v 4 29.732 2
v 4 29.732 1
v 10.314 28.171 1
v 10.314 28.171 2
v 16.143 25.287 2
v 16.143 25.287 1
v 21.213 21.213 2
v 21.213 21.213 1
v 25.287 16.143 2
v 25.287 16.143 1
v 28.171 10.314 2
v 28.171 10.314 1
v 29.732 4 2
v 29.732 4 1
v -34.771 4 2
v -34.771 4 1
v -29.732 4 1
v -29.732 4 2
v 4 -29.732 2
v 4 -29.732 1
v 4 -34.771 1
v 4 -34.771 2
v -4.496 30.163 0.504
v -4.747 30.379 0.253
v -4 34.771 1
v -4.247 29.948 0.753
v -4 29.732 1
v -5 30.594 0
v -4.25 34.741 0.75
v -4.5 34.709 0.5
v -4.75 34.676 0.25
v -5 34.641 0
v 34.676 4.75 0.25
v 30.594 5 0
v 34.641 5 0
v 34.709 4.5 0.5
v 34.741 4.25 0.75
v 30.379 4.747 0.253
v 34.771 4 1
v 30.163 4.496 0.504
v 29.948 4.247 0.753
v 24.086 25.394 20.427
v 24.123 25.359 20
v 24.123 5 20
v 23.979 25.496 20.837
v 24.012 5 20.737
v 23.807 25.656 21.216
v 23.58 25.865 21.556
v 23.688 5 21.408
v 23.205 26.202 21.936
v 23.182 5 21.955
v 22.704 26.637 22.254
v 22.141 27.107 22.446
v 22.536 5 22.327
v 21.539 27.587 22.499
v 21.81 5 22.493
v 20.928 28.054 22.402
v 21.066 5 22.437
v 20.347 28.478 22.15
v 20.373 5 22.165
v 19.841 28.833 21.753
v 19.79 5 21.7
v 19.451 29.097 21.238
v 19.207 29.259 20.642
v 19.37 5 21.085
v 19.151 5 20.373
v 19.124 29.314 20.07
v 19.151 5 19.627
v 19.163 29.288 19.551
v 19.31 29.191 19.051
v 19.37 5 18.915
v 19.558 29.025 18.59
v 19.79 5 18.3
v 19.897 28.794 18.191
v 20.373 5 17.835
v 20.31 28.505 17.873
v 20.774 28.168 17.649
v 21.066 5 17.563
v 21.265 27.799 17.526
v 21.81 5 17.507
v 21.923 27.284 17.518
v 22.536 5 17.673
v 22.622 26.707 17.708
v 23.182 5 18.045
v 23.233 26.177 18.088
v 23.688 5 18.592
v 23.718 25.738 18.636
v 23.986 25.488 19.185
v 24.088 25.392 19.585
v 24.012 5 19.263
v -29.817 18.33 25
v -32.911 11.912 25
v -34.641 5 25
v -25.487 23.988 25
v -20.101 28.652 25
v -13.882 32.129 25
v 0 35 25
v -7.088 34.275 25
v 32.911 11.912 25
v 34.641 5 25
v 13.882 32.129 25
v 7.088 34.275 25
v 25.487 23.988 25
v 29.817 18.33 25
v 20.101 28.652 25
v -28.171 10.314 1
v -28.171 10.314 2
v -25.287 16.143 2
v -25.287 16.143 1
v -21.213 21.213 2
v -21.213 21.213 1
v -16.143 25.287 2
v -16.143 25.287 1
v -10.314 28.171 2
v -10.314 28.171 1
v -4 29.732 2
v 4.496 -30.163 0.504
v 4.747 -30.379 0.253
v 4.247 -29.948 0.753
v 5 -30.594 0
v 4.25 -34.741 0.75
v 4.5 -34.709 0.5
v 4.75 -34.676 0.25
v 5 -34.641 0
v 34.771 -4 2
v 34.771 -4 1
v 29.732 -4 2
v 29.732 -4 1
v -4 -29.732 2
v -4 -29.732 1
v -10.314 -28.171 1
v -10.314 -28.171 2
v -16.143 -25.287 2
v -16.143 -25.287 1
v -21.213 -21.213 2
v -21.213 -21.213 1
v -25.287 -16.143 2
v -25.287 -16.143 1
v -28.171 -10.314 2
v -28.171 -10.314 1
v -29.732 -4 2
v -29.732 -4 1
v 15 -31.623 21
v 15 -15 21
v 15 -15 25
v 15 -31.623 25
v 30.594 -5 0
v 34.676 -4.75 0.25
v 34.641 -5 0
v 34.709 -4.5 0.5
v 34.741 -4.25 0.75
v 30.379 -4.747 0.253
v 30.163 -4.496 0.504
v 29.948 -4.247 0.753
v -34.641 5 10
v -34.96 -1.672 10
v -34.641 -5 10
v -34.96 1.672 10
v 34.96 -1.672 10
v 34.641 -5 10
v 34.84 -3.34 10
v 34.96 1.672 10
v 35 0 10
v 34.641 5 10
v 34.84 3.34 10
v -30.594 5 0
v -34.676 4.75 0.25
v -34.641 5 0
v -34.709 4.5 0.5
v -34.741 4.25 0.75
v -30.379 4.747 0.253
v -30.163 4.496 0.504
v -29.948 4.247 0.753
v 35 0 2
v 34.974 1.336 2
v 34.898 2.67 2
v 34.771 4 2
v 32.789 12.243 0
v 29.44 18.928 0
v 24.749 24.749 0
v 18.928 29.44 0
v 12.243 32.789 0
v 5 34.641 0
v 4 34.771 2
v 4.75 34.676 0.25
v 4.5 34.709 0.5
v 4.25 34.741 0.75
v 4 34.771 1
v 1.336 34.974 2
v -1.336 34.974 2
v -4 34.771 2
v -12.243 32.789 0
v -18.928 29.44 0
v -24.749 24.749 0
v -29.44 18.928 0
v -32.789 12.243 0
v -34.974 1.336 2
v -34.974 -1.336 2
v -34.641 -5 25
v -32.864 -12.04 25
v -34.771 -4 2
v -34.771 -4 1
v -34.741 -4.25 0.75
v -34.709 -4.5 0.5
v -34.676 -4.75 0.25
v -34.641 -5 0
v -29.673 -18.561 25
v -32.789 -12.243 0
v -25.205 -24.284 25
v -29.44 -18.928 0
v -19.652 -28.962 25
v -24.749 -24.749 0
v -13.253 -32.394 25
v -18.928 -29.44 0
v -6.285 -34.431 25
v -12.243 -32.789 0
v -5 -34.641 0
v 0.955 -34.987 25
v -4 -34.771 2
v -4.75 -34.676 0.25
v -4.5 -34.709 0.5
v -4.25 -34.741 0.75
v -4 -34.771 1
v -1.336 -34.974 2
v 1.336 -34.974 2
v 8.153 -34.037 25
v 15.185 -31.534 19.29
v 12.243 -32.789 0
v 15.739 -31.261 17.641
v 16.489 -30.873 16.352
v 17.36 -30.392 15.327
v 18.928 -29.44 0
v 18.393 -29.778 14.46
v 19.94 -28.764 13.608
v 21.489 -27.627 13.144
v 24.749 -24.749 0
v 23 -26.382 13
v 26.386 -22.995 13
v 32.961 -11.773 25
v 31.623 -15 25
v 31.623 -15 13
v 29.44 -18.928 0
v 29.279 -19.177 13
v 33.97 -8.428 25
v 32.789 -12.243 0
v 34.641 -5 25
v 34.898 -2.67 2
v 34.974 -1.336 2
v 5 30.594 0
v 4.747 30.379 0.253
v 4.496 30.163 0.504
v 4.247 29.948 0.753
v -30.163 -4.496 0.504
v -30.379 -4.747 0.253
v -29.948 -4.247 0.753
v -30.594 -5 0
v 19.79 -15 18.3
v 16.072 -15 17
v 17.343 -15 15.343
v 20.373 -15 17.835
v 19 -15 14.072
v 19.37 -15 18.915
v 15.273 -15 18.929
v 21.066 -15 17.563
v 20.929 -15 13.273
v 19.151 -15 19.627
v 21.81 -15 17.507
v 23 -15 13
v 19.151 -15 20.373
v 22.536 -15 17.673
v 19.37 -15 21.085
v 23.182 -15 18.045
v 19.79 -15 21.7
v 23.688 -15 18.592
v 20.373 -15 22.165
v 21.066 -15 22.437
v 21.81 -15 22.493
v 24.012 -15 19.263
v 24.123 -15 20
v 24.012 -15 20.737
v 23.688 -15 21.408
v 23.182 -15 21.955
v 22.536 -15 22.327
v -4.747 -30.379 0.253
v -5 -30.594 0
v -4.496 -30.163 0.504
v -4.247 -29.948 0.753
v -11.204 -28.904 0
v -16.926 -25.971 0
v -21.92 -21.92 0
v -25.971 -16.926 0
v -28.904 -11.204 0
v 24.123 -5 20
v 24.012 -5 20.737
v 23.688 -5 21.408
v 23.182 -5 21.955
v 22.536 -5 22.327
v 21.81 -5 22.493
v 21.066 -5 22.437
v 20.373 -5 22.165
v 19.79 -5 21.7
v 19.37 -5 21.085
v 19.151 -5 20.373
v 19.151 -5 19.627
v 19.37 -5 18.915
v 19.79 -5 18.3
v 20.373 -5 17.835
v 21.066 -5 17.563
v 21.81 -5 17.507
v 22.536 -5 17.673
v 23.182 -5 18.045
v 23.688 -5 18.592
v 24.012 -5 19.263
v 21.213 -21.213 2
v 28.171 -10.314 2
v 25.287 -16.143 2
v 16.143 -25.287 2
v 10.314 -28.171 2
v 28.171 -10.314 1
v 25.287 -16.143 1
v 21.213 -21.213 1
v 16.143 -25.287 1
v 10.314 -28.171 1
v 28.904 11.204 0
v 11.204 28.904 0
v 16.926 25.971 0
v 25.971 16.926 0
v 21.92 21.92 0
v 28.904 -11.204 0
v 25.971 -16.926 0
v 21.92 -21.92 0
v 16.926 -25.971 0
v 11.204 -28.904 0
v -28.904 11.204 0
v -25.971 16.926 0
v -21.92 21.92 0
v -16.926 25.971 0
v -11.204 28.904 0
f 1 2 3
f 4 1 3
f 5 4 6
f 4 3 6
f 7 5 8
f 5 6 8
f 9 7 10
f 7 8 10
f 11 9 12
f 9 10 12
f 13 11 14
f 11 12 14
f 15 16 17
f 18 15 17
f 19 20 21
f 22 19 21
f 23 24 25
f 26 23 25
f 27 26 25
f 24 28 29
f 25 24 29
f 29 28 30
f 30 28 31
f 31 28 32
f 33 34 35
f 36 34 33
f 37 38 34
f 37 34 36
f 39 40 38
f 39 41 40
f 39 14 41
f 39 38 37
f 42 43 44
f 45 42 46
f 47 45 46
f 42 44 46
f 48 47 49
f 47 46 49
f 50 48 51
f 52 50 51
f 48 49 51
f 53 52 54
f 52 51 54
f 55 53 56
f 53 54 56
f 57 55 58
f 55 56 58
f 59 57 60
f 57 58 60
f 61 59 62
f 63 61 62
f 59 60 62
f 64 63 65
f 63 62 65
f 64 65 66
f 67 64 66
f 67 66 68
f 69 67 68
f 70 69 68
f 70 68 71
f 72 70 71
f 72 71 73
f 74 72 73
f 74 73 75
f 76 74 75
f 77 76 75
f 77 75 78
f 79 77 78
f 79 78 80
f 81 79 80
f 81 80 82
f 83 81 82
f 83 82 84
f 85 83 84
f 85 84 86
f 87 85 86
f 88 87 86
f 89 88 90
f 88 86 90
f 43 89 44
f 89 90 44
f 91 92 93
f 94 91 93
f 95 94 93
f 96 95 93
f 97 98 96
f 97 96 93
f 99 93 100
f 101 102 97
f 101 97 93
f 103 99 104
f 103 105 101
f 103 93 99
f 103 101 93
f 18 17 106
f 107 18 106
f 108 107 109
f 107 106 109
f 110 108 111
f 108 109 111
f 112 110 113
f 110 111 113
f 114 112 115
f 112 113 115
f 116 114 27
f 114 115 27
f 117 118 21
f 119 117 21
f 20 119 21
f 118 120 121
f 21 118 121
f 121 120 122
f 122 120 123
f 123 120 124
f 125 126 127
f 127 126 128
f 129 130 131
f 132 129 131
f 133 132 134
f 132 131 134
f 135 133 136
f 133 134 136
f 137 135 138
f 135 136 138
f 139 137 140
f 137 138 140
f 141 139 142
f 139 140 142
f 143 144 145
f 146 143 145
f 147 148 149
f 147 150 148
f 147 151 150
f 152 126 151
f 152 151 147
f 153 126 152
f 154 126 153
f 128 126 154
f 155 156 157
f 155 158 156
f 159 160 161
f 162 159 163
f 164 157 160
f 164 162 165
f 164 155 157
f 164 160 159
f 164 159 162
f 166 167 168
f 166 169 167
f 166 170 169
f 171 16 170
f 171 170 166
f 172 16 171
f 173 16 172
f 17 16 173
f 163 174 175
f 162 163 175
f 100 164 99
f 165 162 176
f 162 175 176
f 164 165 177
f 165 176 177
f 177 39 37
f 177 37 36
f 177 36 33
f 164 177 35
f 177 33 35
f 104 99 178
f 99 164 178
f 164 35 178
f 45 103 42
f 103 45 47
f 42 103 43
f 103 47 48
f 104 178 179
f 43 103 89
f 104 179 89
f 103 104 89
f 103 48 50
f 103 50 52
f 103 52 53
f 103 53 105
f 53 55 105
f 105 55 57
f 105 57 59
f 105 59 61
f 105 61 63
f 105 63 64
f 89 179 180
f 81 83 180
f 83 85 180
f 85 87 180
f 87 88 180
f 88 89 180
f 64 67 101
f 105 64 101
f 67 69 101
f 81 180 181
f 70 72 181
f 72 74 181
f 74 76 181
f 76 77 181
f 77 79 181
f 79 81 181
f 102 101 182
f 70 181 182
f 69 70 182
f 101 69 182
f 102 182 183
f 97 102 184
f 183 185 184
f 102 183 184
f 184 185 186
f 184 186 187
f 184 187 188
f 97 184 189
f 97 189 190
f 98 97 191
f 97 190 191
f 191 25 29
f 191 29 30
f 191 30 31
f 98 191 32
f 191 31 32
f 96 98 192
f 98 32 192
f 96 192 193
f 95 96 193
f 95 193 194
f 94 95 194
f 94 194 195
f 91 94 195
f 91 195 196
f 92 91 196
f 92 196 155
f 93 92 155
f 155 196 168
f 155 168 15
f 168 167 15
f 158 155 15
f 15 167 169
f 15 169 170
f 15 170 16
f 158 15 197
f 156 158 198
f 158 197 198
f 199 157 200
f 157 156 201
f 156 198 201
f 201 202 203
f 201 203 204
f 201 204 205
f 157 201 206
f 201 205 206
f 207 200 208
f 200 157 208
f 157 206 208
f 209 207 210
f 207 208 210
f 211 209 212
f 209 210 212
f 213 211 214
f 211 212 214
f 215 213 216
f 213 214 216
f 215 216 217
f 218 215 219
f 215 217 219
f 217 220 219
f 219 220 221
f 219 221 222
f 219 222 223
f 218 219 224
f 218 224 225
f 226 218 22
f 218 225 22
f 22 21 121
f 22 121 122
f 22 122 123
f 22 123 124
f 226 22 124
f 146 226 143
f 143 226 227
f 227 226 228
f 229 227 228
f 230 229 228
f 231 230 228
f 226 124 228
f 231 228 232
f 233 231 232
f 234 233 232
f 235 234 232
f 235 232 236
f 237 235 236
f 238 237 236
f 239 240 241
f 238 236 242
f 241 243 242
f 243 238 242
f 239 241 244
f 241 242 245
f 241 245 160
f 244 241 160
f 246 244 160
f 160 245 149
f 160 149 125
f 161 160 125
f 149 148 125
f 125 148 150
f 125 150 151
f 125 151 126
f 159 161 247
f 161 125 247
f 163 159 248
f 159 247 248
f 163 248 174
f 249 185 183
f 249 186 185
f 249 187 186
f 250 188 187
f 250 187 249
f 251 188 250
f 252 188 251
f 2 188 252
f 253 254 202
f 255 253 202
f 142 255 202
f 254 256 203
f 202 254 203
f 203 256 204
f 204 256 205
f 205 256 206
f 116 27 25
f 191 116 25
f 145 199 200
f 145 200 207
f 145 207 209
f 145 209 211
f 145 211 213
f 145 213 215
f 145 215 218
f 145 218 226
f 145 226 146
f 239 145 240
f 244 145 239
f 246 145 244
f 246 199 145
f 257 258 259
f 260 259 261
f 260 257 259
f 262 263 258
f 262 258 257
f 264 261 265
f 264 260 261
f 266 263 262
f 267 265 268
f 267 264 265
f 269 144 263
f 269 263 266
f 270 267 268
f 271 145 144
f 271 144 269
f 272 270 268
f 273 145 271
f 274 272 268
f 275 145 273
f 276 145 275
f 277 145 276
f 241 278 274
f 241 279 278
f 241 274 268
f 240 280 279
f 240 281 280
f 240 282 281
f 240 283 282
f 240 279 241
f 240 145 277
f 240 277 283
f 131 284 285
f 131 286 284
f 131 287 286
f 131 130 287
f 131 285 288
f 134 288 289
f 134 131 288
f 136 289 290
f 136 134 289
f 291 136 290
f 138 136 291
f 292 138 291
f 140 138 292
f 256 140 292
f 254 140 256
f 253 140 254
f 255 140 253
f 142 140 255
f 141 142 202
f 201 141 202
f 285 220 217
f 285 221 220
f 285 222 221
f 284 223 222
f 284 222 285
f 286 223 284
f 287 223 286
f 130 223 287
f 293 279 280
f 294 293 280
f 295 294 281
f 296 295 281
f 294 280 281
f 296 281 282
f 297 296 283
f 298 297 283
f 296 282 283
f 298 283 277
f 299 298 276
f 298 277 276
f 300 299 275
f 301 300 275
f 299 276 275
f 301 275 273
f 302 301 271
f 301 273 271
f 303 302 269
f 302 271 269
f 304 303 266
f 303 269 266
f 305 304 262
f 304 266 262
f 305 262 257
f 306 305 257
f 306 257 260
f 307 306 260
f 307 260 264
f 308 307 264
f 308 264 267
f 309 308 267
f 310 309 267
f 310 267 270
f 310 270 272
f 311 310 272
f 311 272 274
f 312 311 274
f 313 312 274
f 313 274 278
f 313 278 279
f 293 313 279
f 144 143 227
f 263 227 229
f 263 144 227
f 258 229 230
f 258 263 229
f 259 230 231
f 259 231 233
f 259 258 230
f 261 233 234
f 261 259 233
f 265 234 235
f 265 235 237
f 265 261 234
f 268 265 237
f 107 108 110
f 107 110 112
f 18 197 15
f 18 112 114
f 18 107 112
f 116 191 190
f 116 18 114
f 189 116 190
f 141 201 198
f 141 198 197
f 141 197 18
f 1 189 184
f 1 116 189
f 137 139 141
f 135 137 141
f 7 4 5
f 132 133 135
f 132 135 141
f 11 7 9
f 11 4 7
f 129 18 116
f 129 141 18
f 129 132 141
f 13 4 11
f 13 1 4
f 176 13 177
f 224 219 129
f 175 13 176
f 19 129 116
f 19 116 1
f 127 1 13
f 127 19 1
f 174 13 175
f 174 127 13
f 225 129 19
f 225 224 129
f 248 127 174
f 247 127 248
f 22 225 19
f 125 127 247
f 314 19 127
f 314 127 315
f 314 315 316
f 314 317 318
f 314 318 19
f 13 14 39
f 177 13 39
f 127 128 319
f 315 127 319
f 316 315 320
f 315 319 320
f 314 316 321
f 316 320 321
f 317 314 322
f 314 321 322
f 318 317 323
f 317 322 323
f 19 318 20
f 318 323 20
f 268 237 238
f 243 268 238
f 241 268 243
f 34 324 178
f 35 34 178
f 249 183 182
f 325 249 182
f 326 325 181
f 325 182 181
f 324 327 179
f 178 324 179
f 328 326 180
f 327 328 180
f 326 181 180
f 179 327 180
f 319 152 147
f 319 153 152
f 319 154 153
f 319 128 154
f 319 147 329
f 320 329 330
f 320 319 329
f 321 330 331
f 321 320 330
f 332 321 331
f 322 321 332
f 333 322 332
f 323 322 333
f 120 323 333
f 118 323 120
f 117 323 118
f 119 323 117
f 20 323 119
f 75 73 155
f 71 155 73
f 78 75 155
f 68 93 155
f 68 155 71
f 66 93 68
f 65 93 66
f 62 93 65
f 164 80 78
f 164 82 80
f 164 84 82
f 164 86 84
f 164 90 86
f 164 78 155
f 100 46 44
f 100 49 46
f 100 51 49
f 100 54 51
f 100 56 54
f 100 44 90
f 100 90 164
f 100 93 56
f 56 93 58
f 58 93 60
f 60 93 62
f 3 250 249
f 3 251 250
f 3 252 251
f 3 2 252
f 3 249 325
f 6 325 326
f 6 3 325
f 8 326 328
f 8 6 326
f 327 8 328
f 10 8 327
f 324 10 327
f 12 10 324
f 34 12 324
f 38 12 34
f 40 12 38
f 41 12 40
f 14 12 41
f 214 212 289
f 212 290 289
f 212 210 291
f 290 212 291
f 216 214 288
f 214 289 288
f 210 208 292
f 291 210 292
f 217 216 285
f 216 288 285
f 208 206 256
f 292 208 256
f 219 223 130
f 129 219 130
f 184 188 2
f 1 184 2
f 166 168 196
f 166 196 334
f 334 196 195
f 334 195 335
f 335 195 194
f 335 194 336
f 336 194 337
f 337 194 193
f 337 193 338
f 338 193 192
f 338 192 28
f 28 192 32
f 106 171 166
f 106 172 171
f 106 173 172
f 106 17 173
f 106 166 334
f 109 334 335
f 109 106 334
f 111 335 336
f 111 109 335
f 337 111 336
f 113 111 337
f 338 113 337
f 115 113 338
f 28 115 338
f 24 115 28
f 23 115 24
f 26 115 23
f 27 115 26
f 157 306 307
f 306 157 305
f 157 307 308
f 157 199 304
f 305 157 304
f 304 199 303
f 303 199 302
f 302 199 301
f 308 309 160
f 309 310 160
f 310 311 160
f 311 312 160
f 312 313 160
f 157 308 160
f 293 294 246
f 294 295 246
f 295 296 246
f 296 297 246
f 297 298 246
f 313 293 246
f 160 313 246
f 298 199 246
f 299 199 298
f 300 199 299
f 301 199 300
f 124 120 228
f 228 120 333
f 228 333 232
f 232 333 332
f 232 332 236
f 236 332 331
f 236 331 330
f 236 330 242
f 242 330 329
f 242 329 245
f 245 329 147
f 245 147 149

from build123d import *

# Parameters (mm, degrees)
F0_R      = 35
F1_DEPTH  = 25
F2_W      = 70
F2_H      = 10
F3_DEPTH  = 15
F5_W      = 8
F5_H      = 12
F6_DEPTH  = 25
F7_R      = 2.5
F8_DEPTH  = 50
F10_DEPTH = 2
F11_SIZE  = 1


with BuildPart() as f1:
    # F0 (on Top) → F1 (new body)
    with BuildSketch(Plane.XY):
        Circle(F0_R)
    extrude(amount=F1_DEPTH)

    # F2 (on face) → F3 (cut)
    with BuildSketch(Plane.XY.offset(25)):
        Rectangle(F2_W, F2_H)
    extrude(amount=-F3_DEPTH, mode=Mode.SUBTRACT)

    # F5 (on offset) → F6 (cut)
    with BuildSketch(Plane.XZ.offset(15)):
        Polygon((58, 13), (58, 33), (23, 33), (23, 21), (23, 13), align=None)
        with Locations((19, 27)):
            Rectangle(F5_W, F5_H)
        with BuildLine():
            Line((23, 13), (23, 21))
            Line((23, 21), (15, 21))
            ThreePointArc((15, 21), (17.3431457505, 15.3431457505), (23, 13))
        make_face()
    extrude(amount=F6_DEPTH, mode=Mode.SUBTRACT)

    # F7 (on face) → F8 (cut)
    with BuildSketch(Plane.XZ.offset(15)):
        with Locations((21.6227766017, 20)):
            Circle(F7_R)
    extrude(amount=-F8_DEPTH, mode=Mode.SUBTRACT)

    # F9 (on face) → F10 (cut)
    with BuildSketch(Plane(origin=(0, 0, 0), x_dir=(1, 0, 0), z_dir=(0, 0, -1))):
        with BuildLine():
            ThreePointArc((29.7321374946, -4), (29.9329594664, -2.0044793789), (30, 0))
            ThreePointArc((30, 0), (29.9329594664, 2.0044793789), (29.7321374946, 4))
            Line((29.7321374946, 4), (29.7321374946, -4))
        make_face()
        with BuildLine():
            ThreePointArc((29.7321374946, 4), (29.9329594664, 2.0044793789), (30, 0))
            ThreePointArc((30, 0), (29.9329594664, -2.0044793789), (29.7321374946, -4))
            Line((29.7321374946, -4), (35.7321374946, -4))
            Line((35.7321374946, -4), (35.7321374946, 4))
            Line((35.7321374946, 4), (29.7321374946, 4))
        make_face()
        with BuildLine():
            Line((29.7321374946, -4), (29.7321374946, 4))
            ThreePointArc((29.7321374946, 4), (21.2132034356, 21.2132034356), (4, 29.7321374946))
            Line((4, 29.7321374946), (-4, 29.7321374946))
            ThreePointArc((-4, 29.7321374946), (-21.2132034356, 21.2132034356), (-29.7321374946, 4))
            Line((-29.7321374946, 4), (-29.7321374946, -4))
            ThreePointArc((-29.7321374946, -4), (-21.2132034356, -21.2132034356), (-4, -29.7321374946))
            Line((-4, -29.7321374946), (4, -29.7321374946))
            ThreePointArc((4, -29.7321374946), (21.2132034356, -21.2132034356), (29.7321374946, -4))
        make_face()
        with BuildLine():
            Line((-4, 29.7321374946), (4, 29.7321374946))
            ThreePointArc((4, 29.7321374946), (0, 30), (-4, 29.7321374946))
        make_face()
        with BuildLine():
            ThreePointArc((-4, 29.7321374946), (0, 30), (4, 29.7321374946))
            Line((4, 29.7321374946), (4, 35.7321374946))
            Line((4, 35.7321374946), (-4, 35.7321374946))
            Line((-4, 35.7321374946), (-4, 29.7321374946))
        make_face()
        with BuildLine():
            Line((4, -35.7321374946), (4, -29.7321374946))
            ThreePointArc((4, -29.7321374946), (0, -30), (-4, -29.7321374946))
            Line((-4, -29.7321374946), (-4, -35.7321374946))
            Line((-4, -35.7321374946), (4, -35.7321374946))
        make_face()
        with BuildLine():
            ThreePointArc((-4, -29.7321374946), (0, -30), (4, -29.7321374946))
            Line((4, -29.7321374946), (-4, -29.7321374946))
        make_face()
        with BuildLine():
            Line((-29.7321374946, -4), (-29.7321374946, 4))
            ThreePointArc((-29.7321374946, 4), (-30, 0), (-29.7321374946, -4))
        make_face()
        with BuildLine():
            ThreePointArc((-29.7321374946, -4), (-30, 0), (-29.7321374946, 4))
            Line((-29.7321374946, 4), (-35.7321374946, 4))
            Line((-35.7321374946, 4), (-35.7321374946, -4))
            Line((-35.7321374946, -4), (-29.7321374946, -4))
        make_face()
    extrude(amount=-F10_DEPTH, mode=Mode.SUBTRACT)

    # F11
    f11_edges = [f1.edges().sort_by_distance(p)[0] for p in [
        (21.213203, -21.213203, 0),
        (-21.213203, -21.213203, 0),
        (21.213203, 21.213203, 0),
        (-21.213203, 21.213203, 0),
        (-32.251407, -4, 0),
        (-32.251407, 4, 0),
        (-4, -32.251407, 0),
        (4, -32.251407, 0),
        (32.251407, -4, 0),
        (32.251407, 4, 0),
        (4, 32.251407, 0),
        (-4, 32.251407, 0),
    ]]
    chamfer(f11_edges, length=F11_SIZE)


solid = f1.part
